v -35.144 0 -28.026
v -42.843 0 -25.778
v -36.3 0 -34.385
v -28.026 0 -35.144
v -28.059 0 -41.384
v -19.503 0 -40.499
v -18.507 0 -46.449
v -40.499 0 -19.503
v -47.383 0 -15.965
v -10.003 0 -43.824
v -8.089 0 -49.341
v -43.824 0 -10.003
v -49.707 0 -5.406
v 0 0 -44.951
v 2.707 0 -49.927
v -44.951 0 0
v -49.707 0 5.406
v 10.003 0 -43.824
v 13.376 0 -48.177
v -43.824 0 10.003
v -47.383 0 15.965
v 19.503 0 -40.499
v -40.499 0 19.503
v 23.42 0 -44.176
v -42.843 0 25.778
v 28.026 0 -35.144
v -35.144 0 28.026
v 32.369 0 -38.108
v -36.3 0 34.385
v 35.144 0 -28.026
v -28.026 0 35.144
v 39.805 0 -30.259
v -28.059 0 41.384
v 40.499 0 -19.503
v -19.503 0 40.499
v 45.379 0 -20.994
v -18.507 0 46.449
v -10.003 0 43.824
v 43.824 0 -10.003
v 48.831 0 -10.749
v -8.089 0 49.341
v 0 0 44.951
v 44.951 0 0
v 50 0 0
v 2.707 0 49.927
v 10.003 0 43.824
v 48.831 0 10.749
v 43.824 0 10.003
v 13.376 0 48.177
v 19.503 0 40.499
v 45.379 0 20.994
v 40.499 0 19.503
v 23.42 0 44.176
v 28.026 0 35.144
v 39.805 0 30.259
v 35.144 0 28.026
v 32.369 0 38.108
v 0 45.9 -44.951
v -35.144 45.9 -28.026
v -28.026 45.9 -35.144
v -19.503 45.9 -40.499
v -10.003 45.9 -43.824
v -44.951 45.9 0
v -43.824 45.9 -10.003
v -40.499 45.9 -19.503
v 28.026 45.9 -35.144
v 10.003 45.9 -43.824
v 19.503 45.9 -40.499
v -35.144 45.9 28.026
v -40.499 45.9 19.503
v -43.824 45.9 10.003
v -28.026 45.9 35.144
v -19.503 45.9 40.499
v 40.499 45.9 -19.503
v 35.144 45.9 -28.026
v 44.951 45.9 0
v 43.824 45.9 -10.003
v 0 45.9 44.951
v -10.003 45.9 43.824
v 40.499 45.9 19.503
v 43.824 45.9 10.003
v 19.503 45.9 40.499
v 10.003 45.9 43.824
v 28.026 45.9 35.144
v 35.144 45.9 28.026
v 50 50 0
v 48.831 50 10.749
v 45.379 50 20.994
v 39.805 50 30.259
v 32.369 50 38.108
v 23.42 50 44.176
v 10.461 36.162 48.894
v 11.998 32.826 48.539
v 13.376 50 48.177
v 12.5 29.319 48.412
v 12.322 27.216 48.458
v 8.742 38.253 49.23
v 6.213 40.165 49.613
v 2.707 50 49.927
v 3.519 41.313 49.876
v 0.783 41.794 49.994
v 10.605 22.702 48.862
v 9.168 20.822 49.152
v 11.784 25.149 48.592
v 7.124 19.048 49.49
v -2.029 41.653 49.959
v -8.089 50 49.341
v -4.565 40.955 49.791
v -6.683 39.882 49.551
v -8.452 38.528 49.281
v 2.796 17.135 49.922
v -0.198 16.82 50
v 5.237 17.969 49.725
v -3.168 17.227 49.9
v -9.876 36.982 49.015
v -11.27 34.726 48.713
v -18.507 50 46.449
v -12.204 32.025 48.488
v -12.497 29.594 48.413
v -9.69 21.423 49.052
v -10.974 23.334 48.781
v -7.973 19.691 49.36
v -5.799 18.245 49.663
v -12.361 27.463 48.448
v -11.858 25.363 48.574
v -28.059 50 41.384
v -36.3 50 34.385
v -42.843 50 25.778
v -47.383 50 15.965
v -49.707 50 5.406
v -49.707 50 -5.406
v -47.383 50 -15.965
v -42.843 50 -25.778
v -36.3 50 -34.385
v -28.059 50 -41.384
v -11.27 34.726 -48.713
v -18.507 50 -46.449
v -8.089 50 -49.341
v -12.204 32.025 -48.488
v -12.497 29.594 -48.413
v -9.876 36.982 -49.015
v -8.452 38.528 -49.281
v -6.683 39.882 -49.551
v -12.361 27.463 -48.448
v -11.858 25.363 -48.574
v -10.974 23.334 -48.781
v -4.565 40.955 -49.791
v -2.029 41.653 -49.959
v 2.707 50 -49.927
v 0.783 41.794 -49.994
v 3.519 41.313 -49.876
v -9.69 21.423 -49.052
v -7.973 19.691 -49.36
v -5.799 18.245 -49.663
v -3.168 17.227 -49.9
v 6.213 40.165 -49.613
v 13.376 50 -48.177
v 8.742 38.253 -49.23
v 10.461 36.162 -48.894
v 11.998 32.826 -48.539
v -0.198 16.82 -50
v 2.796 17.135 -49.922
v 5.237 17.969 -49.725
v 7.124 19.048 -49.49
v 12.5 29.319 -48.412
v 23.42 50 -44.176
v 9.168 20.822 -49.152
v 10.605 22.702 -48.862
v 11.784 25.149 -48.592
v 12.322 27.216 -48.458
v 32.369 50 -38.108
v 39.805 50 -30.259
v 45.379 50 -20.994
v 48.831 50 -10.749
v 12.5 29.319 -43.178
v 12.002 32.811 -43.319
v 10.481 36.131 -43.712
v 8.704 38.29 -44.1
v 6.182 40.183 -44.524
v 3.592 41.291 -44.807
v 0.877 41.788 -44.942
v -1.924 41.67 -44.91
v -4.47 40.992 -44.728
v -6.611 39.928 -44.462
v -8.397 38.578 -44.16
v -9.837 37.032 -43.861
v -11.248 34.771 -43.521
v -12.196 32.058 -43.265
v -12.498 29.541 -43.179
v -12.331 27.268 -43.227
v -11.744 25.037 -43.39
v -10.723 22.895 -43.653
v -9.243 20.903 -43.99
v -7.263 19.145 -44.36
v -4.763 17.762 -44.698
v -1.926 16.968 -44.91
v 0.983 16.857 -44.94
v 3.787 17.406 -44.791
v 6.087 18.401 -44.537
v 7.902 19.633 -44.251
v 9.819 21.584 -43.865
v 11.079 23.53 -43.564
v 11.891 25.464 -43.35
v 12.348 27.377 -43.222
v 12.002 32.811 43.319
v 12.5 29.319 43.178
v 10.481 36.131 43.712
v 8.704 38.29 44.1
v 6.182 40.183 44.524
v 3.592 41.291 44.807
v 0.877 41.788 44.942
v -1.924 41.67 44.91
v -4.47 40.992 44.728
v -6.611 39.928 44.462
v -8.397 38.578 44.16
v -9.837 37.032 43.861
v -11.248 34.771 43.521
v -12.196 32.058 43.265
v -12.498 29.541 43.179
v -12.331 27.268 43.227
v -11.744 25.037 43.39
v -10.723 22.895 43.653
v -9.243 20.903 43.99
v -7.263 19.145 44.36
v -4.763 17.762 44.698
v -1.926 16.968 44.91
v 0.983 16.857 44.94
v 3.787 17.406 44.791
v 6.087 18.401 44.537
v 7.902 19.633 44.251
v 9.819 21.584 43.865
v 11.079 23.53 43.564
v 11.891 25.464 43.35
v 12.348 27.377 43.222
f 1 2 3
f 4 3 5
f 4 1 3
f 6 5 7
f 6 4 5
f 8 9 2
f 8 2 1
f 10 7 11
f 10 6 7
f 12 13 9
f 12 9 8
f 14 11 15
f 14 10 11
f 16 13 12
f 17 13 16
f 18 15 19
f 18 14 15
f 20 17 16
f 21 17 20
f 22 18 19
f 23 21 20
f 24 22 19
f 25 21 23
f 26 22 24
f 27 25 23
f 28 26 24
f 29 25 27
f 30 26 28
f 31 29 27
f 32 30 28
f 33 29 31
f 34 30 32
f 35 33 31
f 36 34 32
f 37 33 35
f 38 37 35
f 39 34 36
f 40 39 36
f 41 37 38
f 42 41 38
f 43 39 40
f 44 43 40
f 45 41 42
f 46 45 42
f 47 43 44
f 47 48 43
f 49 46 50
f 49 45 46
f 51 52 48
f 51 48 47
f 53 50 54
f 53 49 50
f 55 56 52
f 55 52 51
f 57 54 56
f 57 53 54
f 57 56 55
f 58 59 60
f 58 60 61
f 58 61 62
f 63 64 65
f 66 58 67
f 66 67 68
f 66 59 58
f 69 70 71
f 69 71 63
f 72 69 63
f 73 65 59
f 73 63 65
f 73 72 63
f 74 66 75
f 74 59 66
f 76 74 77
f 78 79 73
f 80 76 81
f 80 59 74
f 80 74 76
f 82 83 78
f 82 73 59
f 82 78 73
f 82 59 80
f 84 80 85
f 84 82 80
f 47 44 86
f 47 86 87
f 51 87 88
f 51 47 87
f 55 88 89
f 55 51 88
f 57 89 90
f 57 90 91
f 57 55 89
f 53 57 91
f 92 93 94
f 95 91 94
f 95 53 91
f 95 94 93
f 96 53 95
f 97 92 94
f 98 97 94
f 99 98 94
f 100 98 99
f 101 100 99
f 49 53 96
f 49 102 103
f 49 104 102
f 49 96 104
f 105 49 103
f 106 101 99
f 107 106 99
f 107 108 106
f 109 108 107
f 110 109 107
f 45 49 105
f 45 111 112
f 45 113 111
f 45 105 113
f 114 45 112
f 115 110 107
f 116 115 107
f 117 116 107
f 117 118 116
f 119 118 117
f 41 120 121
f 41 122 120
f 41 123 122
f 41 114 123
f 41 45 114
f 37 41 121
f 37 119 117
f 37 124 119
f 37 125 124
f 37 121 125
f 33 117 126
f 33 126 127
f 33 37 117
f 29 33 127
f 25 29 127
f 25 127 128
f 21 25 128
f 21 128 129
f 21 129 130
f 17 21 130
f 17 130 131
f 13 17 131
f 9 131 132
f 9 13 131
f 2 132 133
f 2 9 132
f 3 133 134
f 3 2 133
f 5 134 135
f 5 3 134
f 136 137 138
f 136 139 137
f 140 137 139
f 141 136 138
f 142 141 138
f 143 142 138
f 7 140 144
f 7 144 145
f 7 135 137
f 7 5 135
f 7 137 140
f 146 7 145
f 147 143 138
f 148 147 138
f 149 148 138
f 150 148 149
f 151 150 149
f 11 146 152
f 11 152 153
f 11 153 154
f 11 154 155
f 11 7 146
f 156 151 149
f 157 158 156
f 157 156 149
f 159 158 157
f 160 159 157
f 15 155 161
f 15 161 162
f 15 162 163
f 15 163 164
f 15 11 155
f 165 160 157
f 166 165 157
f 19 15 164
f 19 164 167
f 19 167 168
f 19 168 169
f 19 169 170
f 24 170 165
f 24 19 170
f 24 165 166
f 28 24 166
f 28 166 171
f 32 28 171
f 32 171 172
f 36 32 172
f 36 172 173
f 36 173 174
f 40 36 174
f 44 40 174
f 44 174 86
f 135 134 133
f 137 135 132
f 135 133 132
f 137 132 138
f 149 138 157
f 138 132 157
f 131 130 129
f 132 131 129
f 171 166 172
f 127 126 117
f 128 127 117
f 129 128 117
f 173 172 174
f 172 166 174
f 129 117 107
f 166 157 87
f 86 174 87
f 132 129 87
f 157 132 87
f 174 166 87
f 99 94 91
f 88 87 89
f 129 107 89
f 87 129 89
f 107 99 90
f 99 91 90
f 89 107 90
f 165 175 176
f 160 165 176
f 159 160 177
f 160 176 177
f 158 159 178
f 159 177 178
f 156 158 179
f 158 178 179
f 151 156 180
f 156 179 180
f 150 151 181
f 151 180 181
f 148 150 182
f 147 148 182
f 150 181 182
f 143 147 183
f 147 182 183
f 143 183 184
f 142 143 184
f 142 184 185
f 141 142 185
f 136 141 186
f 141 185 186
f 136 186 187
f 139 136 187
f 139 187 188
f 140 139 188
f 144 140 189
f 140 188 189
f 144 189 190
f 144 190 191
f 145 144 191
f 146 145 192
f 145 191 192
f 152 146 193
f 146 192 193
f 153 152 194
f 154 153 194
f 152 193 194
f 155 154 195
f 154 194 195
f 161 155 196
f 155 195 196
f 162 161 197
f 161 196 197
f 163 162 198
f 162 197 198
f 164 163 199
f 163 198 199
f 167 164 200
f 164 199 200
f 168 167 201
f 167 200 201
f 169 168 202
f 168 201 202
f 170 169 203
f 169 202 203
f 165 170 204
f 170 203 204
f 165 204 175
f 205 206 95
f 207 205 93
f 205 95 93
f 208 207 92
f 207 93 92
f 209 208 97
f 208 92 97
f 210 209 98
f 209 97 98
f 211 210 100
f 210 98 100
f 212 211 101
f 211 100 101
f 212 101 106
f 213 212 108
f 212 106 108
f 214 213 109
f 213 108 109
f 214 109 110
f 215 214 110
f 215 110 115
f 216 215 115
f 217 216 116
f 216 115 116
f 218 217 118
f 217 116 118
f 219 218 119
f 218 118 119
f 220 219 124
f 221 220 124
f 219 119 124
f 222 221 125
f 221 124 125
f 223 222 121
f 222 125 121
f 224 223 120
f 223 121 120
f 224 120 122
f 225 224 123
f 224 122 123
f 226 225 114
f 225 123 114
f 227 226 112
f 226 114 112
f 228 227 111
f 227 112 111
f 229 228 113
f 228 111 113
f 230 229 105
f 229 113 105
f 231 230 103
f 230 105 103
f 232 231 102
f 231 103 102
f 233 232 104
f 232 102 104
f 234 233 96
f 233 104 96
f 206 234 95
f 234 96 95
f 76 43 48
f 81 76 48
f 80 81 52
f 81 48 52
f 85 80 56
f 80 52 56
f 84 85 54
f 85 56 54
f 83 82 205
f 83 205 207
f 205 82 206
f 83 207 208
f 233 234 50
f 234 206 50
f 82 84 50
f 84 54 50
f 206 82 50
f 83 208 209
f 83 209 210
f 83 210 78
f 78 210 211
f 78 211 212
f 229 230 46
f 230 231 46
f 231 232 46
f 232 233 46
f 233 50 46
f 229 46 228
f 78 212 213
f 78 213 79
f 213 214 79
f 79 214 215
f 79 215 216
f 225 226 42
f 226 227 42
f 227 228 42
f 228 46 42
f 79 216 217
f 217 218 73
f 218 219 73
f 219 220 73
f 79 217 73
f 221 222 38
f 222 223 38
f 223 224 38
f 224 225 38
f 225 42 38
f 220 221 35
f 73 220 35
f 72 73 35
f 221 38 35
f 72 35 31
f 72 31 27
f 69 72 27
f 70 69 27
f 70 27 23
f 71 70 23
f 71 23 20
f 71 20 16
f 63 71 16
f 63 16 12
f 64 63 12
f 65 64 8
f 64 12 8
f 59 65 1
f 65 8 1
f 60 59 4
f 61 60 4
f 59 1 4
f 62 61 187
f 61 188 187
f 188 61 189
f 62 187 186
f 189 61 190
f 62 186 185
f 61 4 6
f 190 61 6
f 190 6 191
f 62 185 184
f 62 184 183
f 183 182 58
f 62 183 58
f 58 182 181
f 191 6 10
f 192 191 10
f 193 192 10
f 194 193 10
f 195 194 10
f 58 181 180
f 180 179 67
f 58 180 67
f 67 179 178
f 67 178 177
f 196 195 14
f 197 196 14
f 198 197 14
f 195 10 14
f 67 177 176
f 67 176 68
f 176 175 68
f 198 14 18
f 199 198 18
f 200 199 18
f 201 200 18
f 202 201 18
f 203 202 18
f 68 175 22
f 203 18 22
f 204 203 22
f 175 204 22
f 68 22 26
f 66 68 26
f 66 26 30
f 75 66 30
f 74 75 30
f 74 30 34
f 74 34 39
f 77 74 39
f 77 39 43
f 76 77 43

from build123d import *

# Parameters (mm, degrees)
F0_R     = 50
F1_DEPTH = 50
F2_R     = 12.5
F3_DEPTH = 104.2
F4_R     = 44.950947
F5_DEPTH = 45.9


with BuildPart() as f1:
    # F0 (on Front) → F1 (new body)
    with BuildSketch(Plane.XZ):
        Circle(F0_R)
    extrude(amount=-F1_DEPTH)

    # F2 (on Top) → F3 (cut, symmetric)
    with BuildSketch(Plane.XY):
        with Locations((0, 29.318675)):
            Circle(F2_R)
    extrude(amount=F3_DEPTH, both=True, mode=Mode.SUBTRACT)

    # F4 (on Front) → F5 (cut)
    with BuildSketch(Plane.XZ):
        Circle(F4_R)
    extrude(amount=-F5_DEPTH, mode=Mode.SUBTRACT)


solid = f1.part
